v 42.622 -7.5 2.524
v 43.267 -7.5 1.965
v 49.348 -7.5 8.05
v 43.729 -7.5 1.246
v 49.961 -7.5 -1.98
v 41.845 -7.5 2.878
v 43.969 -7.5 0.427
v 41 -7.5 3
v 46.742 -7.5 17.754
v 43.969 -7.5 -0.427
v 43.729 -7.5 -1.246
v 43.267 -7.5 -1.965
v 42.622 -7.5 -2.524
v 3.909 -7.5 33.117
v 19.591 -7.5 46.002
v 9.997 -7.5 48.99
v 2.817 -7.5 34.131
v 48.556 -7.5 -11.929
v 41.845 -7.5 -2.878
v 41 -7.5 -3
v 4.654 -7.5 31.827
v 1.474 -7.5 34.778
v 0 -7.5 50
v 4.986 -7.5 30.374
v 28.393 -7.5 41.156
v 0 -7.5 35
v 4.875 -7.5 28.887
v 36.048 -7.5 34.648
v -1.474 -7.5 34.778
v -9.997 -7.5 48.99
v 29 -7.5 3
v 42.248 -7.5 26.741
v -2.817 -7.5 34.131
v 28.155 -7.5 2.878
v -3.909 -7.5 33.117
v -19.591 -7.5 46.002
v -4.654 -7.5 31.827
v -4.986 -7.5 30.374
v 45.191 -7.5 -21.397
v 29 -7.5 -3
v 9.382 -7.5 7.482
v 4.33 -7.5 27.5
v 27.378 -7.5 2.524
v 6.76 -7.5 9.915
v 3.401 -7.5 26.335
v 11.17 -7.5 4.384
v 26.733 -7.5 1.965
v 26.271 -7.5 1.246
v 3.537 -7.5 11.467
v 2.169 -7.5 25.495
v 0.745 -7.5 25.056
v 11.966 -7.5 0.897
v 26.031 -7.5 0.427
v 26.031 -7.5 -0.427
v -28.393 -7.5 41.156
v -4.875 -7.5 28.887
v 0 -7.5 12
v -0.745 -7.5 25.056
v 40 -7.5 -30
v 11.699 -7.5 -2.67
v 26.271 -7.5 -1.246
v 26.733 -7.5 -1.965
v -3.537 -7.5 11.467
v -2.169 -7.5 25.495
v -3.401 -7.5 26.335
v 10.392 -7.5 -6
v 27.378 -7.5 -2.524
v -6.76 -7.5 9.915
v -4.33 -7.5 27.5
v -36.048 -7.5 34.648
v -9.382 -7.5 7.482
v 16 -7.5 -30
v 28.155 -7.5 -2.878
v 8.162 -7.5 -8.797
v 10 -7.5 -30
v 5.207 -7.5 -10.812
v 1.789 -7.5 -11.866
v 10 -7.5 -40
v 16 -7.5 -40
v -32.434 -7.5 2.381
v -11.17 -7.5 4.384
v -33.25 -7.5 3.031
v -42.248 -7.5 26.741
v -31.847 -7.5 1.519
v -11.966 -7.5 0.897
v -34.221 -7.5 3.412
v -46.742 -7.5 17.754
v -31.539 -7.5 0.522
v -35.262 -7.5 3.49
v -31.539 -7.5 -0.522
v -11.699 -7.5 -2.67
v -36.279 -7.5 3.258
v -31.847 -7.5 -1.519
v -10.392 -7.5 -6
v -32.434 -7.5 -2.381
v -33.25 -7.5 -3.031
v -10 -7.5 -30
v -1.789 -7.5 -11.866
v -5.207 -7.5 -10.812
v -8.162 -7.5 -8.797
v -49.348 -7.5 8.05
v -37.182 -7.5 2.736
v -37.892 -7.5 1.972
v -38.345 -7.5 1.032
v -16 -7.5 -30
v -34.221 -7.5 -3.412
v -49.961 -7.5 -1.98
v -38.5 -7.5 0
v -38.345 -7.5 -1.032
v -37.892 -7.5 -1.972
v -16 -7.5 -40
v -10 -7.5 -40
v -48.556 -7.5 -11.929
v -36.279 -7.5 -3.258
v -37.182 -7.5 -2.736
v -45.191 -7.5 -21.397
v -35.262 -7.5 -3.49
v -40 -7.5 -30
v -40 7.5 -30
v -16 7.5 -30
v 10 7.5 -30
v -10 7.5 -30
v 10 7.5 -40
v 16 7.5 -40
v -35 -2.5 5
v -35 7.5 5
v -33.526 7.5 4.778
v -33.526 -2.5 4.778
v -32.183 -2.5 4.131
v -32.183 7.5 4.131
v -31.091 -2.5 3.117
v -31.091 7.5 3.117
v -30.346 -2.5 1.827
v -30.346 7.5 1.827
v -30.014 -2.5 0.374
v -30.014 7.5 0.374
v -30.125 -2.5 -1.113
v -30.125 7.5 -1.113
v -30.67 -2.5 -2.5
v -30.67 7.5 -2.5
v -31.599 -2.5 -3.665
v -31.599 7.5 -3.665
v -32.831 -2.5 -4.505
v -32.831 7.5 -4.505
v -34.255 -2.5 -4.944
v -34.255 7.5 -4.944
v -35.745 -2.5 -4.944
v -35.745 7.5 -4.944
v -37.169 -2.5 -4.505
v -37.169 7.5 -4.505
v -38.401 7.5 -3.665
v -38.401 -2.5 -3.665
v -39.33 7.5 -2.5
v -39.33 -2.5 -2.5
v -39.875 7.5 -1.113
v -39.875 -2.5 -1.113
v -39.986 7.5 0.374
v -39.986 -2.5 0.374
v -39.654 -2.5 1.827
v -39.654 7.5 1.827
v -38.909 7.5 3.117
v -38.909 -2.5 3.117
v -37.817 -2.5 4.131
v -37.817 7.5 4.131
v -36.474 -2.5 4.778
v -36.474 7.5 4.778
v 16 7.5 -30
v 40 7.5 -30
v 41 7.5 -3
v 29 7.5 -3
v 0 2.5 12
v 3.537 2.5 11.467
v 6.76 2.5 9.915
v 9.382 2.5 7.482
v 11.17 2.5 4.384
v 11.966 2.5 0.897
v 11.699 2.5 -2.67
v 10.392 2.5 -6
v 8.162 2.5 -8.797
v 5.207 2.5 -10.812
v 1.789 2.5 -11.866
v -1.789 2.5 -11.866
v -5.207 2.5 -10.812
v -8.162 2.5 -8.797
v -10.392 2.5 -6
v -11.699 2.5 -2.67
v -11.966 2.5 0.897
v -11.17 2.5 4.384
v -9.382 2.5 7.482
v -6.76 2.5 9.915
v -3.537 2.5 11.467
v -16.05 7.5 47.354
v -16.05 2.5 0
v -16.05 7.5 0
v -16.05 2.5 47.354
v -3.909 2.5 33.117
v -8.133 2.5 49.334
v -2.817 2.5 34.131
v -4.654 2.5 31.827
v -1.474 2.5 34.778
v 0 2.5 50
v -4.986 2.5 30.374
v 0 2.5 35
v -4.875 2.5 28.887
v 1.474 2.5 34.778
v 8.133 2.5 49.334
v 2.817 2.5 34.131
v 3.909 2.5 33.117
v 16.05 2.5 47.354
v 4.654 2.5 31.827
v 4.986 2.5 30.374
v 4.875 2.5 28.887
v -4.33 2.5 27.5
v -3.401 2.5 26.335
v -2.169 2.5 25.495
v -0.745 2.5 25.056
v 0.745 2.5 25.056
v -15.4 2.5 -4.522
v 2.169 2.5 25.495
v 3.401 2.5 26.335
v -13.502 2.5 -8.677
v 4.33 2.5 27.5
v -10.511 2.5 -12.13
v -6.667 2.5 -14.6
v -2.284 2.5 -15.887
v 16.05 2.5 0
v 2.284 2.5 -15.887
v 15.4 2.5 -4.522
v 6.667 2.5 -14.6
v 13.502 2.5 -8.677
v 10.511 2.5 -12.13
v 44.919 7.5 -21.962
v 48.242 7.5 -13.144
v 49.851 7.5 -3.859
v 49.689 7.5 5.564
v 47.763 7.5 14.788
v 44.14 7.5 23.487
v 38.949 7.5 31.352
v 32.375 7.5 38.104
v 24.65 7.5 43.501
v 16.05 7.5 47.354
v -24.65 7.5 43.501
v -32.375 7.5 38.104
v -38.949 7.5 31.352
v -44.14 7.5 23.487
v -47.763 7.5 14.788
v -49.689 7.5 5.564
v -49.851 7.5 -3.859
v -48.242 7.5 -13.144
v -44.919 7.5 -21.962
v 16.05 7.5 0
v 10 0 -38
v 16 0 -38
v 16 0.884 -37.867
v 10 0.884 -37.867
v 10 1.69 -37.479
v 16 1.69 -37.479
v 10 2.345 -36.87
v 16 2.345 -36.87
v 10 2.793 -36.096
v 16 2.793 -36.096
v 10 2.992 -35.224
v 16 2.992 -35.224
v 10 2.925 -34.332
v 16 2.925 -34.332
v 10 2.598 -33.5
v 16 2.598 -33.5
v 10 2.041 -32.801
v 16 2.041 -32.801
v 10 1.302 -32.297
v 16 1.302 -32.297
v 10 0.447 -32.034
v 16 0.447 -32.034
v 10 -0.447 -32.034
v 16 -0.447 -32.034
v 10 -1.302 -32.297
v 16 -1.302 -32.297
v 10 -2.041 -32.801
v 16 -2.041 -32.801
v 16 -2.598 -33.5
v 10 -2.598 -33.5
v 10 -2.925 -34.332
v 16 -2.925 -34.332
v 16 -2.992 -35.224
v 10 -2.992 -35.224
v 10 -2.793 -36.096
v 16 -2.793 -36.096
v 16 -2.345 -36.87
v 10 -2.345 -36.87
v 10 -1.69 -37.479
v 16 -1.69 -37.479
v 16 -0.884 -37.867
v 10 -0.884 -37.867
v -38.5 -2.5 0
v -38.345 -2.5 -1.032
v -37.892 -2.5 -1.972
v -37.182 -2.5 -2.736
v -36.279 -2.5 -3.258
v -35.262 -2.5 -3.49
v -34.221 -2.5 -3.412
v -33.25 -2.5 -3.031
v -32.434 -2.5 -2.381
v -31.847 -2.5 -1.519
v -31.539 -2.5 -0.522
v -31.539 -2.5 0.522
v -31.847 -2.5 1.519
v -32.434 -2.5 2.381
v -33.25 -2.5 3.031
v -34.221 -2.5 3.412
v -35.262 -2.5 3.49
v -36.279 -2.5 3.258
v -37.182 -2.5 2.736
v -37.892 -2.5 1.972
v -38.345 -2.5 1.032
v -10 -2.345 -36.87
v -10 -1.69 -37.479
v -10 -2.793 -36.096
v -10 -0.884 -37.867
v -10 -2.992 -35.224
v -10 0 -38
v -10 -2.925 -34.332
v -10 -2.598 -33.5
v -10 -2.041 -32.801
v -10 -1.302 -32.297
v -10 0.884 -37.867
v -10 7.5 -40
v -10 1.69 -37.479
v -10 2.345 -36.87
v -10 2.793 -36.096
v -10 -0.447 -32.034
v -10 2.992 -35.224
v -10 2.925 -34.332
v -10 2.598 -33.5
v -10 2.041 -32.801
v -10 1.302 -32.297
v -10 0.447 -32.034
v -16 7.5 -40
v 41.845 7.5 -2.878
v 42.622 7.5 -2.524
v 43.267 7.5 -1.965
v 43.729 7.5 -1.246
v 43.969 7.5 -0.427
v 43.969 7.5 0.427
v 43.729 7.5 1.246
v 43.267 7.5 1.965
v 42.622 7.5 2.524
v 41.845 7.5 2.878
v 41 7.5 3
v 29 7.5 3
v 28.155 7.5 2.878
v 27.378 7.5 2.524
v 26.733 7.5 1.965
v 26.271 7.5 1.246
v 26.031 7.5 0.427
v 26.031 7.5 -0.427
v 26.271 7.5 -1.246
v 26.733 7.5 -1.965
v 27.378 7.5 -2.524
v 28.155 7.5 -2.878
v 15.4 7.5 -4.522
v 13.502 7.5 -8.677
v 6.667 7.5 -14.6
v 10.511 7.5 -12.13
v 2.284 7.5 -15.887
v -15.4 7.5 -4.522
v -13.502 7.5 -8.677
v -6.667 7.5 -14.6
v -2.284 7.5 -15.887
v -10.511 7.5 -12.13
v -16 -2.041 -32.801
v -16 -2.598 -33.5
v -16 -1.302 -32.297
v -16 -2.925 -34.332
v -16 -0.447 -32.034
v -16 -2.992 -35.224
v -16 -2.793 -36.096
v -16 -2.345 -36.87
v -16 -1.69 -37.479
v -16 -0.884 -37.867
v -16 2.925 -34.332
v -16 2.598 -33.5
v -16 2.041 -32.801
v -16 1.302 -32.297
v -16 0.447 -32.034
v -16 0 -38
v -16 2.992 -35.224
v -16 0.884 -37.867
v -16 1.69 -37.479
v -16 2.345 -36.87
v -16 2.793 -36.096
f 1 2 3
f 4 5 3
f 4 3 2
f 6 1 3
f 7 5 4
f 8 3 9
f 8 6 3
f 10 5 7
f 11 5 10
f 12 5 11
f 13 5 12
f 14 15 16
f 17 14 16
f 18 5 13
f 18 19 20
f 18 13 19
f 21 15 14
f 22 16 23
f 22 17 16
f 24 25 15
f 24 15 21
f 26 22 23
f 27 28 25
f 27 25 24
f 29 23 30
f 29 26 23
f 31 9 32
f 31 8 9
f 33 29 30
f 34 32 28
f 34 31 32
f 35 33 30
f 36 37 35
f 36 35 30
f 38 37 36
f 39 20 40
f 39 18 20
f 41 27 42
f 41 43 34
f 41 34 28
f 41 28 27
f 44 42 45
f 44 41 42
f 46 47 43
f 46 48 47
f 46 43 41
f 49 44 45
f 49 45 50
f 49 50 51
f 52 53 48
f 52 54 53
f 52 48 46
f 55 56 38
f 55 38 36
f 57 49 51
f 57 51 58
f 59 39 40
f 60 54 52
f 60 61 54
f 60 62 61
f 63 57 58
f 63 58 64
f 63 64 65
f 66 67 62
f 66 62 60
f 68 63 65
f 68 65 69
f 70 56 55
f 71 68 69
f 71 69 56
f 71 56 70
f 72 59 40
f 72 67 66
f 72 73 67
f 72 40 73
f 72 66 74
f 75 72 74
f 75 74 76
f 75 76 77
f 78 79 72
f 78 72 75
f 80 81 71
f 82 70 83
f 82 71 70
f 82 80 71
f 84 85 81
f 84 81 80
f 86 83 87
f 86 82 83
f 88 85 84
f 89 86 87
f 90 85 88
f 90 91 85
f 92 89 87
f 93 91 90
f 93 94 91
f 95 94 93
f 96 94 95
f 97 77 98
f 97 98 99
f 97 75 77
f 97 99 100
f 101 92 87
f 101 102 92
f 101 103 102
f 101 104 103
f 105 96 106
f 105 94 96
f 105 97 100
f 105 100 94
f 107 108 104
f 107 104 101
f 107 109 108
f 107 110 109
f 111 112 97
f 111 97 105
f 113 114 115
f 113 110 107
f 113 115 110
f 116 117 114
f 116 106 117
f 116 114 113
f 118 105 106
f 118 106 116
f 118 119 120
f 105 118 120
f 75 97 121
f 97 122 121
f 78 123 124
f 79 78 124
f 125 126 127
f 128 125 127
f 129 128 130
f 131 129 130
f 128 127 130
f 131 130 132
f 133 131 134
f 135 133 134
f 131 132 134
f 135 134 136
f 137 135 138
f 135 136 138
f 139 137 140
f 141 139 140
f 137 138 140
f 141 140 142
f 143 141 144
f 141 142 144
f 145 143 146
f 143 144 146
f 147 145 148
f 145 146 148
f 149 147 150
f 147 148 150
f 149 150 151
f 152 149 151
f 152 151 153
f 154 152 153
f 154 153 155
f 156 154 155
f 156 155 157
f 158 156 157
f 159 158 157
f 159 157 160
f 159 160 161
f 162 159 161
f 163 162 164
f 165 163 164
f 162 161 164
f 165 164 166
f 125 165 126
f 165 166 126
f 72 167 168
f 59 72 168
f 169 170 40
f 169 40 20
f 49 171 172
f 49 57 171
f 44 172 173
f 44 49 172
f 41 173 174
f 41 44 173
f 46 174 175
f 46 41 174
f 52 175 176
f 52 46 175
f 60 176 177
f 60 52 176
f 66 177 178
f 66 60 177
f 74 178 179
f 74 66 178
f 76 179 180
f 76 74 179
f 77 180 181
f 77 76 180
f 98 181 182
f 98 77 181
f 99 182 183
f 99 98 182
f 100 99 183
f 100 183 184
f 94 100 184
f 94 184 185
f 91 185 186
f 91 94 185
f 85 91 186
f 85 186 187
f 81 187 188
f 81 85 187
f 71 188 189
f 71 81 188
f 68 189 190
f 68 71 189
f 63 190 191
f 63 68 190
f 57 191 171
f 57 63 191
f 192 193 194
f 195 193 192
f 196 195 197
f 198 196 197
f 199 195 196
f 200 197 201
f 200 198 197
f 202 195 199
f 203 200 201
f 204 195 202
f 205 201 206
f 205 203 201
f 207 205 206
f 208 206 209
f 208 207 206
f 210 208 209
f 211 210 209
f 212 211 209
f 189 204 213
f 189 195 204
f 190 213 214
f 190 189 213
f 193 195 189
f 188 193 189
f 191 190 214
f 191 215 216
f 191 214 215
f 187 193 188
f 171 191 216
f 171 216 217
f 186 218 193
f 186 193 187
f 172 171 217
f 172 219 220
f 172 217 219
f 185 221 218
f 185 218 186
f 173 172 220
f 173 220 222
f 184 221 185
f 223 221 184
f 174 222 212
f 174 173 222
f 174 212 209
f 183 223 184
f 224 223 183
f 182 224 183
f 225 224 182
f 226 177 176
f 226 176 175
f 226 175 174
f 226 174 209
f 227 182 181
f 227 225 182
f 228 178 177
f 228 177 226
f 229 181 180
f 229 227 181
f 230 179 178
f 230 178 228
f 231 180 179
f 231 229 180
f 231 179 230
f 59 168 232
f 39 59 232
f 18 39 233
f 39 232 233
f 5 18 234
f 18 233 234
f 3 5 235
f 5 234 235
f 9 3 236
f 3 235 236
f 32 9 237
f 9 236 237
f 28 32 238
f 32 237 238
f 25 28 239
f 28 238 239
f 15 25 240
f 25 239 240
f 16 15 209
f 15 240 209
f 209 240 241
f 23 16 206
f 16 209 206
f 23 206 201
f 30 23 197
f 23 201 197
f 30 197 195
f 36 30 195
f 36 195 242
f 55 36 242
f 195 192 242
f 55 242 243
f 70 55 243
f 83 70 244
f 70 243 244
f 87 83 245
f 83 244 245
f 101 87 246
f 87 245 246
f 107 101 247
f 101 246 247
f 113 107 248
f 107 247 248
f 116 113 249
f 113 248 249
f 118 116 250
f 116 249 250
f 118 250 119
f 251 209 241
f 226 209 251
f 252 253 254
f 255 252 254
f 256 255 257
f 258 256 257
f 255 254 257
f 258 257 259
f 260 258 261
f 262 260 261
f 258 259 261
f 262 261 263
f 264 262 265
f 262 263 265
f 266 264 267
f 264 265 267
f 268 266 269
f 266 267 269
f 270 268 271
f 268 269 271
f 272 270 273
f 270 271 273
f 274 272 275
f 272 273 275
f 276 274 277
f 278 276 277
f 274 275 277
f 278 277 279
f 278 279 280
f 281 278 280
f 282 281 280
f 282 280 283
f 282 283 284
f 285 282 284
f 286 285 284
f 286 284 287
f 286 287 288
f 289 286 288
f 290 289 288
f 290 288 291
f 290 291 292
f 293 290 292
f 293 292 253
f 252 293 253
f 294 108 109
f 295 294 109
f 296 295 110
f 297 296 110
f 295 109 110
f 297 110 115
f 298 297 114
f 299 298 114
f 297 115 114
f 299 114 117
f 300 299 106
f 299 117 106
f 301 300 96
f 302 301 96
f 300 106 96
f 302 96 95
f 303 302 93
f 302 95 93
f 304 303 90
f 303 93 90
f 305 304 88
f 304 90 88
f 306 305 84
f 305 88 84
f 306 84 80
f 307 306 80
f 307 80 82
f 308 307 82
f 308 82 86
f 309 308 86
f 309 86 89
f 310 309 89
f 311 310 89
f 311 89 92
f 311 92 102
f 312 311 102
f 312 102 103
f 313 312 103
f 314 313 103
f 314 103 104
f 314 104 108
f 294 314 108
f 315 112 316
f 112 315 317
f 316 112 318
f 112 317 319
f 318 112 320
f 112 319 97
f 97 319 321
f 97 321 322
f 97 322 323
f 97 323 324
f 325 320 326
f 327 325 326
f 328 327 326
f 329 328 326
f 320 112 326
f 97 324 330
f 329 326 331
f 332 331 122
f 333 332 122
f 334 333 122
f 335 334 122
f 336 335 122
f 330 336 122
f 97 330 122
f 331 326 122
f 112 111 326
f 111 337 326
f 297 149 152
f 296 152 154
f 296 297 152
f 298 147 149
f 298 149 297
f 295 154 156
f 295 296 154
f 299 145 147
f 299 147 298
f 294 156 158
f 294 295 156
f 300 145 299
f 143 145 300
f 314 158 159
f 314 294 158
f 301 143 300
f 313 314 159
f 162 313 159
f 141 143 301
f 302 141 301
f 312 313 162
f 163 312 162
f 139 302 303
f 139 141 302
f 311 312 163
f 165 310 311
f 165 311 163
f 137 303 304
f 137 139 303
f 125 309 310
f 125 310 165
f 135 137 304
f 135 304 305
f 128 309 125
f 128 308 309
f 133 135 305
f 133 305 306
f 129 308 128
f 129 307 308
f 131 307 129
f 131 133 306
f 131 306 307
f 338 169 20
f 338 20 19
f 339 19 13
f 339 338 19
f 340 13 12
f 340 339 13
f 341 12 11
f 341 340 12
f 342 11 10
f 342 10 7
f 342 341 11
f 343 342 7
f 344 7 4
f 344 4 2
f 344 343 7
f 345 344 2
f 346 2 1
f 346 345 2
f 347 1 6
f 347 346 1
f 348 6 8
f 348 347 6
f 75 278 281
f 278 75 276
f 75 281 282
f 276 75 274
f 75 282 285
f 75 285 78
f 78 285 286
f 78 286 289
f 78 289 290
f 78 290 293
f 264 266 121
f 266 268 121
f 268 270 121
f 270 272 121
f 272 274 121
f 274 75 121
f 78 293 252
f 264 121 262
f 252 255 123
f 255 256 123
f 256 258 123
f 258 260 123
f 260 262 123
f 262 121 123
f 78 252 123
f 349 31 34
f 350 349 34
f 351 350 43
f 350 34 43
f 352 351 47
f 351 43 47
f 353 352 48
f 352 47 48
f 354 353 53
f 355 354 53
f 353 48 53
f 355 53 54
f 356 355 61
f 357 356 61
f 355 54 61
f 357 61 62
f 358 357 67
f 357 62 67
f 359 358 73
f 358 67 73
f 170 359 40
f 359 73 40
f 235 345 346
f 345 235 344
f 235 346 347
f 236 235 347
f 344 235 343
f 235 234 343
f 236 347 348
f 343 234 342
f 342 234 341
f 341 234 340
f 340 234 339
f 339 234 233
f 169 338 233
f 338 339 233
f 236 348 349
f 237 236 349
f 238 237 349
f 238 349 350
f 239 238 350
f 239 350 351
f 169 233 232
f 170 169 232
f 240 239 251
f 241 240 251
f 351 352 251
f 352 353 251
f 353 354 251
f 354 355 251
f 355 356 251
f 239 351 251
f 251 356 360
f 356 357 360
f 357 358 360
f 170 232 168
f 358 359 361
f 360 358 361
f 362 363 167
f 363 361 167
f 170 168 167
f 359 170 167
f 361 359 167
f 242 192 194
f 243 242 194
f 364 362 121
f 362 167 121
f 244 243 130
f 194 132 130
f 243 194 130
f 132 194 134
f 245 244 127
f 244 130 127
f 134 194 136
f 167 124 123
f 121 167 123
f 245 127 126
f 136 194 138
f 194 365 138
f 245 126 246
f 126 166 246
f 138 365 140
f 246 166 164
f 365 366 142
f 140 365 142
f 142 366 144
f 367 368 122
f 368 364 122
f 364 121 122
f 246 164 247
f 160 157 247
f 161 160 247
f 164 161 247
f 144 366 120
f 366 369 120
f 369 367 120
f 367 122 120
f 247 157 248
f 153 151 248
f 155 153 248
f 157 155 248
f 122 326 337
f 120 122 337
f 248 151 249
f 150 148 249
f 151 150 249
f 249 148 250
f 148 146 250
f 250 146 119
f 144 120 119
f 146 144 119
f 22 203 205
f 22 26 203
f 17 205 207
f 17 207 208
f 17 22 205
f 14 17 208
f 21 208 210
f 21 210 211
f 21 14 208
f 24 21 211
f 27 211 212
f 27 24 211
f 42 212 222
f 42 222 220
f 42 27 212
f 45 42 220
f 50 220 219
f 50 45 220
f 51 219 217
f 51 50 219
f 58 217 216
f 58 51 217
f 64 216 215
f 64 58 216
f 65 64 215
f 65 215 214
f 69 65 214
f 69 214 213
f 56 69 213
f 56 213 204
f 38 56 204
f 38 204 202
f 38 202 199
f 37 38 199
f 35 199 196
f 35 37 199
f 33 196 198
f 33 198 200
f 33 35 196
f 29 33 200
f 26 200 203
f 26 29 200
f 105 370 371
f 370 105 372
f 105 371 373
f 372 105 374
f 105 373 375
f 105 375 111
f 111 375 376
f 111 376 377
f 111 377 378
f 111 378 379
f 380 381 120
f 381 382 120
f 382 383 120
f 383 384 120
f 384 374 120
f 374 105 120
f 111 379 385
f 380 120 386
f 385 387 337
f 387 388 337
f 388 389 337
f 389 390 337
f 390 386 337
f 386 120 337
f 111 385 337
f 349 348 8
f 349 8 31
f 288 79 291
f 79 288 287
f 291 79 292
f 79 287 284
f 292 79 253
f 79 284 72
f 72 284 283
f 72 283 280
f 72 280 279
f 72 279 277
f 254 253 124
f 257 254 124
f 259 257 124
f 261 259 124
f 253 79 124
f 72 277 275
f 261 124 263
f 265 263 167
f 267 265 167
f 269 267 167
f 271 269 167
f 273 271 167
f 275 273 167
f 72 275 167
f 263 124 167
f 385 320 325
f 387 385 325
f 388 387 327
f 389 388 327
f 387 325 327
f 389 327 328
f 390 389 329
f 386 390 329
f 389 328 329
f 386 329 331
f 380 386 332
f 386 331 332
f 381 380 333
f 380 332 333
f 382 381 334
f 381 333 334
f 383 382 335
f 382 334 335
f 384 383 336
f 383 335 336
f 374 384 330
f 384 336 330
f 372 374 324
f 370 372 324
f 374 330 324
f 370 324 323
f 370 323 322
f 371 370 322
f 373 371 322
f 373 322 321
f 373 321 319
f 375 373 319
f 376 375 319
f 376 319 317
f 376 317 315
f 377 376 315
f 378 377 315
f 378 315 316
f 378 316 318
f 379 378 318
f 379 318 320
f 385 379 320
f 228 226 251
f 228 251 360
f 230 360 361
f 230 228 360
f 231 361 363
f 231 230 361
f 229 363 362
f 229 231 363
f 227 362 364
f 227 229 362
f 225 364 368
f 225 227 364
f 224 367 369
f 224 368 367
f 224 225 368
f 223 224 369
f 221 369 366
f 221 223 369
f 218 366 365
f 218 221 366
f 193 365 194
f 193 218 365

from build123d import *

# Parameters (mm, degrees)
SCHIZZO1_R                    = 12
SCHIZZO1_R_2                  = 5
ESTRUSIONE_ESTRUSIONE1_DEPTH  = 7.5
TAGLIO_ESTRUSIONE1_DEPTH      = 73.284161474
TAGLIO_ESTRUSIONE1_DEPTH_BACK = 5
SCHIZZO3_R                    = 5
SCHIZZO4_R                    = 5
TAGLIO_ESTRUSIONE2_DEPTH      = 10
FORO_7_0_7_1_D                = 7
FORO_6_0_6_1_D                = 6


with BuildPart() as part:
    # Schizzo1 → Estrusione-Estrusione1 (new, symmetric)
    with BuildSketch(Plane(origin=(0, 0, 0), x_dir=(1, 0, 0), z_dir=(0, 1, 0))):
        with BuildLine():
            Line((-40, 30), (-16, 30))
            Line((-16, 30), (-16, 40))
            Line((-16, 40), (-10, 40))
            Line((-10, 40), (-10, 30))
            Line((-10, 30), (10, 30))
            Line((10, 30), (10, 40))
            Line((10, 40), (16, 40))
            Line((16, 40), (16, 30))
            Line((16, 30), (40, 30))
            ThreePointArc((40, 30), (0, -50), (-40, 30))
        make_face()
        with Locations(Location((0, 0, 0), (0, 0, 270))):
            Circle(SCHIZZO1_R, mode=Mode.SUBTRACT)
        with Locations(Location((0, -30, 0), (0, 0, 270))):
            Circle(SCHIZZO1_R_2, mode=Mode.SUBTRACT)
        with BuildLine():
            Line((29, 3), (41, 3))
            ThreePointArc((41, 3), (44, 0), (41, -3))
            Line((41, -3), (29, -3))
            ThreePointArc((29, -3), (26, 0), (29, 3))
        make_face(mode=Mode.SUBTRACT)
    extrude(amount=ESTRUSIONE_ESTRUSIONE1_DEPTH, both=True)

    # Schizzo3 → Taglio-Estrusione1 (cut, two sides: drawn at the far end of the back side and taken through both)
    # profile 1 of 2: a face of its own
    with BuildSketch(Plane(origin=(0, 7.5, 0), x_dir=(1, 0, 0), z_dir=(0, 1, 0)).offset(-TAGLIO_ESTRUSIONE1_DEPTH_BACK)):
        with BuildLine():
            Line((16.05, 0), (12, 0))
            ThreePointArc((12, 0), (0, -12), (-12, 0))
            Line((-12, 0), (-16.05, 0))
            Line((-16.05, 0), (-16.05, -47.353959708))
            ThreePointArc((-16.05, -47.353959708), (0, -50), (16.05, -47.353959708))
            Line((16.05, -47.353959708), (16.05, 0))
        make_face()
        with Locations(Location((0, -30, 0), (0, 0, 270))):
            Circle(SCHIZZO3_R, mode=Mode.SUBTRACT)
    # profile 2 of 2: a face of its own
    with BuildSketch(Plane(origin=(0, 7.5, 0), x_dir=(1, 0, 0), z_dir=(0, 1, 0)).offset(-TAGLIO_ESTRUSIONE1_DEPTH_BACK)):
        with BuildLine():
            ThreePointArc((-12, 0), (0, 12), (12, 0))
            Line((12, 0), (16.05, 0))
            ThreePointArc((16.05, 0), (0, 16.05), (-16.05, 0))
            Line((-16.05, 0), (-12, 0))
        make_face()
    extrude(amount=TAGLIO_ESTRUSIONE1_DEPTH + TAGLIO_ESTRUSIONE1_DEPTH_BACK, mode=Mode.SUBTRACT)

    # Schizzo4 → Taglio-Estrusione2 (cut)
    with BuildSketch(Plane(origin=(0, 7.5, 0), x_dir=(1, 0, 0), z_dir=(0, 1, 0))):
        with Locations(Location((-35, 0, 0), (0, 0, 270))):
            Circle(SCHIZZO4_R)
    extrude(amount=-TAGLIO_ESTRUSIONE2_DEPTH, mode=Mode.SUBTRACT)

    # Foro Ø7.0 (7)-1 (through all)
    with Locations(Plane(origin=(0, -2.5, 0), x_dir=(1, 0, 0), z_dir=(0, 1, 0))):
        with Locations((-35, 0)):
            Hole(FORO_7_0_7_1_D / 2)

    # Foro Ø6.0 (6)-1 (through all)
    with Locations(Plane.ZY.offset(16)):
        with Locations((-35, 0)):
            Hole(FORO_6_0_6_1_D / 2)


solid = part.part
